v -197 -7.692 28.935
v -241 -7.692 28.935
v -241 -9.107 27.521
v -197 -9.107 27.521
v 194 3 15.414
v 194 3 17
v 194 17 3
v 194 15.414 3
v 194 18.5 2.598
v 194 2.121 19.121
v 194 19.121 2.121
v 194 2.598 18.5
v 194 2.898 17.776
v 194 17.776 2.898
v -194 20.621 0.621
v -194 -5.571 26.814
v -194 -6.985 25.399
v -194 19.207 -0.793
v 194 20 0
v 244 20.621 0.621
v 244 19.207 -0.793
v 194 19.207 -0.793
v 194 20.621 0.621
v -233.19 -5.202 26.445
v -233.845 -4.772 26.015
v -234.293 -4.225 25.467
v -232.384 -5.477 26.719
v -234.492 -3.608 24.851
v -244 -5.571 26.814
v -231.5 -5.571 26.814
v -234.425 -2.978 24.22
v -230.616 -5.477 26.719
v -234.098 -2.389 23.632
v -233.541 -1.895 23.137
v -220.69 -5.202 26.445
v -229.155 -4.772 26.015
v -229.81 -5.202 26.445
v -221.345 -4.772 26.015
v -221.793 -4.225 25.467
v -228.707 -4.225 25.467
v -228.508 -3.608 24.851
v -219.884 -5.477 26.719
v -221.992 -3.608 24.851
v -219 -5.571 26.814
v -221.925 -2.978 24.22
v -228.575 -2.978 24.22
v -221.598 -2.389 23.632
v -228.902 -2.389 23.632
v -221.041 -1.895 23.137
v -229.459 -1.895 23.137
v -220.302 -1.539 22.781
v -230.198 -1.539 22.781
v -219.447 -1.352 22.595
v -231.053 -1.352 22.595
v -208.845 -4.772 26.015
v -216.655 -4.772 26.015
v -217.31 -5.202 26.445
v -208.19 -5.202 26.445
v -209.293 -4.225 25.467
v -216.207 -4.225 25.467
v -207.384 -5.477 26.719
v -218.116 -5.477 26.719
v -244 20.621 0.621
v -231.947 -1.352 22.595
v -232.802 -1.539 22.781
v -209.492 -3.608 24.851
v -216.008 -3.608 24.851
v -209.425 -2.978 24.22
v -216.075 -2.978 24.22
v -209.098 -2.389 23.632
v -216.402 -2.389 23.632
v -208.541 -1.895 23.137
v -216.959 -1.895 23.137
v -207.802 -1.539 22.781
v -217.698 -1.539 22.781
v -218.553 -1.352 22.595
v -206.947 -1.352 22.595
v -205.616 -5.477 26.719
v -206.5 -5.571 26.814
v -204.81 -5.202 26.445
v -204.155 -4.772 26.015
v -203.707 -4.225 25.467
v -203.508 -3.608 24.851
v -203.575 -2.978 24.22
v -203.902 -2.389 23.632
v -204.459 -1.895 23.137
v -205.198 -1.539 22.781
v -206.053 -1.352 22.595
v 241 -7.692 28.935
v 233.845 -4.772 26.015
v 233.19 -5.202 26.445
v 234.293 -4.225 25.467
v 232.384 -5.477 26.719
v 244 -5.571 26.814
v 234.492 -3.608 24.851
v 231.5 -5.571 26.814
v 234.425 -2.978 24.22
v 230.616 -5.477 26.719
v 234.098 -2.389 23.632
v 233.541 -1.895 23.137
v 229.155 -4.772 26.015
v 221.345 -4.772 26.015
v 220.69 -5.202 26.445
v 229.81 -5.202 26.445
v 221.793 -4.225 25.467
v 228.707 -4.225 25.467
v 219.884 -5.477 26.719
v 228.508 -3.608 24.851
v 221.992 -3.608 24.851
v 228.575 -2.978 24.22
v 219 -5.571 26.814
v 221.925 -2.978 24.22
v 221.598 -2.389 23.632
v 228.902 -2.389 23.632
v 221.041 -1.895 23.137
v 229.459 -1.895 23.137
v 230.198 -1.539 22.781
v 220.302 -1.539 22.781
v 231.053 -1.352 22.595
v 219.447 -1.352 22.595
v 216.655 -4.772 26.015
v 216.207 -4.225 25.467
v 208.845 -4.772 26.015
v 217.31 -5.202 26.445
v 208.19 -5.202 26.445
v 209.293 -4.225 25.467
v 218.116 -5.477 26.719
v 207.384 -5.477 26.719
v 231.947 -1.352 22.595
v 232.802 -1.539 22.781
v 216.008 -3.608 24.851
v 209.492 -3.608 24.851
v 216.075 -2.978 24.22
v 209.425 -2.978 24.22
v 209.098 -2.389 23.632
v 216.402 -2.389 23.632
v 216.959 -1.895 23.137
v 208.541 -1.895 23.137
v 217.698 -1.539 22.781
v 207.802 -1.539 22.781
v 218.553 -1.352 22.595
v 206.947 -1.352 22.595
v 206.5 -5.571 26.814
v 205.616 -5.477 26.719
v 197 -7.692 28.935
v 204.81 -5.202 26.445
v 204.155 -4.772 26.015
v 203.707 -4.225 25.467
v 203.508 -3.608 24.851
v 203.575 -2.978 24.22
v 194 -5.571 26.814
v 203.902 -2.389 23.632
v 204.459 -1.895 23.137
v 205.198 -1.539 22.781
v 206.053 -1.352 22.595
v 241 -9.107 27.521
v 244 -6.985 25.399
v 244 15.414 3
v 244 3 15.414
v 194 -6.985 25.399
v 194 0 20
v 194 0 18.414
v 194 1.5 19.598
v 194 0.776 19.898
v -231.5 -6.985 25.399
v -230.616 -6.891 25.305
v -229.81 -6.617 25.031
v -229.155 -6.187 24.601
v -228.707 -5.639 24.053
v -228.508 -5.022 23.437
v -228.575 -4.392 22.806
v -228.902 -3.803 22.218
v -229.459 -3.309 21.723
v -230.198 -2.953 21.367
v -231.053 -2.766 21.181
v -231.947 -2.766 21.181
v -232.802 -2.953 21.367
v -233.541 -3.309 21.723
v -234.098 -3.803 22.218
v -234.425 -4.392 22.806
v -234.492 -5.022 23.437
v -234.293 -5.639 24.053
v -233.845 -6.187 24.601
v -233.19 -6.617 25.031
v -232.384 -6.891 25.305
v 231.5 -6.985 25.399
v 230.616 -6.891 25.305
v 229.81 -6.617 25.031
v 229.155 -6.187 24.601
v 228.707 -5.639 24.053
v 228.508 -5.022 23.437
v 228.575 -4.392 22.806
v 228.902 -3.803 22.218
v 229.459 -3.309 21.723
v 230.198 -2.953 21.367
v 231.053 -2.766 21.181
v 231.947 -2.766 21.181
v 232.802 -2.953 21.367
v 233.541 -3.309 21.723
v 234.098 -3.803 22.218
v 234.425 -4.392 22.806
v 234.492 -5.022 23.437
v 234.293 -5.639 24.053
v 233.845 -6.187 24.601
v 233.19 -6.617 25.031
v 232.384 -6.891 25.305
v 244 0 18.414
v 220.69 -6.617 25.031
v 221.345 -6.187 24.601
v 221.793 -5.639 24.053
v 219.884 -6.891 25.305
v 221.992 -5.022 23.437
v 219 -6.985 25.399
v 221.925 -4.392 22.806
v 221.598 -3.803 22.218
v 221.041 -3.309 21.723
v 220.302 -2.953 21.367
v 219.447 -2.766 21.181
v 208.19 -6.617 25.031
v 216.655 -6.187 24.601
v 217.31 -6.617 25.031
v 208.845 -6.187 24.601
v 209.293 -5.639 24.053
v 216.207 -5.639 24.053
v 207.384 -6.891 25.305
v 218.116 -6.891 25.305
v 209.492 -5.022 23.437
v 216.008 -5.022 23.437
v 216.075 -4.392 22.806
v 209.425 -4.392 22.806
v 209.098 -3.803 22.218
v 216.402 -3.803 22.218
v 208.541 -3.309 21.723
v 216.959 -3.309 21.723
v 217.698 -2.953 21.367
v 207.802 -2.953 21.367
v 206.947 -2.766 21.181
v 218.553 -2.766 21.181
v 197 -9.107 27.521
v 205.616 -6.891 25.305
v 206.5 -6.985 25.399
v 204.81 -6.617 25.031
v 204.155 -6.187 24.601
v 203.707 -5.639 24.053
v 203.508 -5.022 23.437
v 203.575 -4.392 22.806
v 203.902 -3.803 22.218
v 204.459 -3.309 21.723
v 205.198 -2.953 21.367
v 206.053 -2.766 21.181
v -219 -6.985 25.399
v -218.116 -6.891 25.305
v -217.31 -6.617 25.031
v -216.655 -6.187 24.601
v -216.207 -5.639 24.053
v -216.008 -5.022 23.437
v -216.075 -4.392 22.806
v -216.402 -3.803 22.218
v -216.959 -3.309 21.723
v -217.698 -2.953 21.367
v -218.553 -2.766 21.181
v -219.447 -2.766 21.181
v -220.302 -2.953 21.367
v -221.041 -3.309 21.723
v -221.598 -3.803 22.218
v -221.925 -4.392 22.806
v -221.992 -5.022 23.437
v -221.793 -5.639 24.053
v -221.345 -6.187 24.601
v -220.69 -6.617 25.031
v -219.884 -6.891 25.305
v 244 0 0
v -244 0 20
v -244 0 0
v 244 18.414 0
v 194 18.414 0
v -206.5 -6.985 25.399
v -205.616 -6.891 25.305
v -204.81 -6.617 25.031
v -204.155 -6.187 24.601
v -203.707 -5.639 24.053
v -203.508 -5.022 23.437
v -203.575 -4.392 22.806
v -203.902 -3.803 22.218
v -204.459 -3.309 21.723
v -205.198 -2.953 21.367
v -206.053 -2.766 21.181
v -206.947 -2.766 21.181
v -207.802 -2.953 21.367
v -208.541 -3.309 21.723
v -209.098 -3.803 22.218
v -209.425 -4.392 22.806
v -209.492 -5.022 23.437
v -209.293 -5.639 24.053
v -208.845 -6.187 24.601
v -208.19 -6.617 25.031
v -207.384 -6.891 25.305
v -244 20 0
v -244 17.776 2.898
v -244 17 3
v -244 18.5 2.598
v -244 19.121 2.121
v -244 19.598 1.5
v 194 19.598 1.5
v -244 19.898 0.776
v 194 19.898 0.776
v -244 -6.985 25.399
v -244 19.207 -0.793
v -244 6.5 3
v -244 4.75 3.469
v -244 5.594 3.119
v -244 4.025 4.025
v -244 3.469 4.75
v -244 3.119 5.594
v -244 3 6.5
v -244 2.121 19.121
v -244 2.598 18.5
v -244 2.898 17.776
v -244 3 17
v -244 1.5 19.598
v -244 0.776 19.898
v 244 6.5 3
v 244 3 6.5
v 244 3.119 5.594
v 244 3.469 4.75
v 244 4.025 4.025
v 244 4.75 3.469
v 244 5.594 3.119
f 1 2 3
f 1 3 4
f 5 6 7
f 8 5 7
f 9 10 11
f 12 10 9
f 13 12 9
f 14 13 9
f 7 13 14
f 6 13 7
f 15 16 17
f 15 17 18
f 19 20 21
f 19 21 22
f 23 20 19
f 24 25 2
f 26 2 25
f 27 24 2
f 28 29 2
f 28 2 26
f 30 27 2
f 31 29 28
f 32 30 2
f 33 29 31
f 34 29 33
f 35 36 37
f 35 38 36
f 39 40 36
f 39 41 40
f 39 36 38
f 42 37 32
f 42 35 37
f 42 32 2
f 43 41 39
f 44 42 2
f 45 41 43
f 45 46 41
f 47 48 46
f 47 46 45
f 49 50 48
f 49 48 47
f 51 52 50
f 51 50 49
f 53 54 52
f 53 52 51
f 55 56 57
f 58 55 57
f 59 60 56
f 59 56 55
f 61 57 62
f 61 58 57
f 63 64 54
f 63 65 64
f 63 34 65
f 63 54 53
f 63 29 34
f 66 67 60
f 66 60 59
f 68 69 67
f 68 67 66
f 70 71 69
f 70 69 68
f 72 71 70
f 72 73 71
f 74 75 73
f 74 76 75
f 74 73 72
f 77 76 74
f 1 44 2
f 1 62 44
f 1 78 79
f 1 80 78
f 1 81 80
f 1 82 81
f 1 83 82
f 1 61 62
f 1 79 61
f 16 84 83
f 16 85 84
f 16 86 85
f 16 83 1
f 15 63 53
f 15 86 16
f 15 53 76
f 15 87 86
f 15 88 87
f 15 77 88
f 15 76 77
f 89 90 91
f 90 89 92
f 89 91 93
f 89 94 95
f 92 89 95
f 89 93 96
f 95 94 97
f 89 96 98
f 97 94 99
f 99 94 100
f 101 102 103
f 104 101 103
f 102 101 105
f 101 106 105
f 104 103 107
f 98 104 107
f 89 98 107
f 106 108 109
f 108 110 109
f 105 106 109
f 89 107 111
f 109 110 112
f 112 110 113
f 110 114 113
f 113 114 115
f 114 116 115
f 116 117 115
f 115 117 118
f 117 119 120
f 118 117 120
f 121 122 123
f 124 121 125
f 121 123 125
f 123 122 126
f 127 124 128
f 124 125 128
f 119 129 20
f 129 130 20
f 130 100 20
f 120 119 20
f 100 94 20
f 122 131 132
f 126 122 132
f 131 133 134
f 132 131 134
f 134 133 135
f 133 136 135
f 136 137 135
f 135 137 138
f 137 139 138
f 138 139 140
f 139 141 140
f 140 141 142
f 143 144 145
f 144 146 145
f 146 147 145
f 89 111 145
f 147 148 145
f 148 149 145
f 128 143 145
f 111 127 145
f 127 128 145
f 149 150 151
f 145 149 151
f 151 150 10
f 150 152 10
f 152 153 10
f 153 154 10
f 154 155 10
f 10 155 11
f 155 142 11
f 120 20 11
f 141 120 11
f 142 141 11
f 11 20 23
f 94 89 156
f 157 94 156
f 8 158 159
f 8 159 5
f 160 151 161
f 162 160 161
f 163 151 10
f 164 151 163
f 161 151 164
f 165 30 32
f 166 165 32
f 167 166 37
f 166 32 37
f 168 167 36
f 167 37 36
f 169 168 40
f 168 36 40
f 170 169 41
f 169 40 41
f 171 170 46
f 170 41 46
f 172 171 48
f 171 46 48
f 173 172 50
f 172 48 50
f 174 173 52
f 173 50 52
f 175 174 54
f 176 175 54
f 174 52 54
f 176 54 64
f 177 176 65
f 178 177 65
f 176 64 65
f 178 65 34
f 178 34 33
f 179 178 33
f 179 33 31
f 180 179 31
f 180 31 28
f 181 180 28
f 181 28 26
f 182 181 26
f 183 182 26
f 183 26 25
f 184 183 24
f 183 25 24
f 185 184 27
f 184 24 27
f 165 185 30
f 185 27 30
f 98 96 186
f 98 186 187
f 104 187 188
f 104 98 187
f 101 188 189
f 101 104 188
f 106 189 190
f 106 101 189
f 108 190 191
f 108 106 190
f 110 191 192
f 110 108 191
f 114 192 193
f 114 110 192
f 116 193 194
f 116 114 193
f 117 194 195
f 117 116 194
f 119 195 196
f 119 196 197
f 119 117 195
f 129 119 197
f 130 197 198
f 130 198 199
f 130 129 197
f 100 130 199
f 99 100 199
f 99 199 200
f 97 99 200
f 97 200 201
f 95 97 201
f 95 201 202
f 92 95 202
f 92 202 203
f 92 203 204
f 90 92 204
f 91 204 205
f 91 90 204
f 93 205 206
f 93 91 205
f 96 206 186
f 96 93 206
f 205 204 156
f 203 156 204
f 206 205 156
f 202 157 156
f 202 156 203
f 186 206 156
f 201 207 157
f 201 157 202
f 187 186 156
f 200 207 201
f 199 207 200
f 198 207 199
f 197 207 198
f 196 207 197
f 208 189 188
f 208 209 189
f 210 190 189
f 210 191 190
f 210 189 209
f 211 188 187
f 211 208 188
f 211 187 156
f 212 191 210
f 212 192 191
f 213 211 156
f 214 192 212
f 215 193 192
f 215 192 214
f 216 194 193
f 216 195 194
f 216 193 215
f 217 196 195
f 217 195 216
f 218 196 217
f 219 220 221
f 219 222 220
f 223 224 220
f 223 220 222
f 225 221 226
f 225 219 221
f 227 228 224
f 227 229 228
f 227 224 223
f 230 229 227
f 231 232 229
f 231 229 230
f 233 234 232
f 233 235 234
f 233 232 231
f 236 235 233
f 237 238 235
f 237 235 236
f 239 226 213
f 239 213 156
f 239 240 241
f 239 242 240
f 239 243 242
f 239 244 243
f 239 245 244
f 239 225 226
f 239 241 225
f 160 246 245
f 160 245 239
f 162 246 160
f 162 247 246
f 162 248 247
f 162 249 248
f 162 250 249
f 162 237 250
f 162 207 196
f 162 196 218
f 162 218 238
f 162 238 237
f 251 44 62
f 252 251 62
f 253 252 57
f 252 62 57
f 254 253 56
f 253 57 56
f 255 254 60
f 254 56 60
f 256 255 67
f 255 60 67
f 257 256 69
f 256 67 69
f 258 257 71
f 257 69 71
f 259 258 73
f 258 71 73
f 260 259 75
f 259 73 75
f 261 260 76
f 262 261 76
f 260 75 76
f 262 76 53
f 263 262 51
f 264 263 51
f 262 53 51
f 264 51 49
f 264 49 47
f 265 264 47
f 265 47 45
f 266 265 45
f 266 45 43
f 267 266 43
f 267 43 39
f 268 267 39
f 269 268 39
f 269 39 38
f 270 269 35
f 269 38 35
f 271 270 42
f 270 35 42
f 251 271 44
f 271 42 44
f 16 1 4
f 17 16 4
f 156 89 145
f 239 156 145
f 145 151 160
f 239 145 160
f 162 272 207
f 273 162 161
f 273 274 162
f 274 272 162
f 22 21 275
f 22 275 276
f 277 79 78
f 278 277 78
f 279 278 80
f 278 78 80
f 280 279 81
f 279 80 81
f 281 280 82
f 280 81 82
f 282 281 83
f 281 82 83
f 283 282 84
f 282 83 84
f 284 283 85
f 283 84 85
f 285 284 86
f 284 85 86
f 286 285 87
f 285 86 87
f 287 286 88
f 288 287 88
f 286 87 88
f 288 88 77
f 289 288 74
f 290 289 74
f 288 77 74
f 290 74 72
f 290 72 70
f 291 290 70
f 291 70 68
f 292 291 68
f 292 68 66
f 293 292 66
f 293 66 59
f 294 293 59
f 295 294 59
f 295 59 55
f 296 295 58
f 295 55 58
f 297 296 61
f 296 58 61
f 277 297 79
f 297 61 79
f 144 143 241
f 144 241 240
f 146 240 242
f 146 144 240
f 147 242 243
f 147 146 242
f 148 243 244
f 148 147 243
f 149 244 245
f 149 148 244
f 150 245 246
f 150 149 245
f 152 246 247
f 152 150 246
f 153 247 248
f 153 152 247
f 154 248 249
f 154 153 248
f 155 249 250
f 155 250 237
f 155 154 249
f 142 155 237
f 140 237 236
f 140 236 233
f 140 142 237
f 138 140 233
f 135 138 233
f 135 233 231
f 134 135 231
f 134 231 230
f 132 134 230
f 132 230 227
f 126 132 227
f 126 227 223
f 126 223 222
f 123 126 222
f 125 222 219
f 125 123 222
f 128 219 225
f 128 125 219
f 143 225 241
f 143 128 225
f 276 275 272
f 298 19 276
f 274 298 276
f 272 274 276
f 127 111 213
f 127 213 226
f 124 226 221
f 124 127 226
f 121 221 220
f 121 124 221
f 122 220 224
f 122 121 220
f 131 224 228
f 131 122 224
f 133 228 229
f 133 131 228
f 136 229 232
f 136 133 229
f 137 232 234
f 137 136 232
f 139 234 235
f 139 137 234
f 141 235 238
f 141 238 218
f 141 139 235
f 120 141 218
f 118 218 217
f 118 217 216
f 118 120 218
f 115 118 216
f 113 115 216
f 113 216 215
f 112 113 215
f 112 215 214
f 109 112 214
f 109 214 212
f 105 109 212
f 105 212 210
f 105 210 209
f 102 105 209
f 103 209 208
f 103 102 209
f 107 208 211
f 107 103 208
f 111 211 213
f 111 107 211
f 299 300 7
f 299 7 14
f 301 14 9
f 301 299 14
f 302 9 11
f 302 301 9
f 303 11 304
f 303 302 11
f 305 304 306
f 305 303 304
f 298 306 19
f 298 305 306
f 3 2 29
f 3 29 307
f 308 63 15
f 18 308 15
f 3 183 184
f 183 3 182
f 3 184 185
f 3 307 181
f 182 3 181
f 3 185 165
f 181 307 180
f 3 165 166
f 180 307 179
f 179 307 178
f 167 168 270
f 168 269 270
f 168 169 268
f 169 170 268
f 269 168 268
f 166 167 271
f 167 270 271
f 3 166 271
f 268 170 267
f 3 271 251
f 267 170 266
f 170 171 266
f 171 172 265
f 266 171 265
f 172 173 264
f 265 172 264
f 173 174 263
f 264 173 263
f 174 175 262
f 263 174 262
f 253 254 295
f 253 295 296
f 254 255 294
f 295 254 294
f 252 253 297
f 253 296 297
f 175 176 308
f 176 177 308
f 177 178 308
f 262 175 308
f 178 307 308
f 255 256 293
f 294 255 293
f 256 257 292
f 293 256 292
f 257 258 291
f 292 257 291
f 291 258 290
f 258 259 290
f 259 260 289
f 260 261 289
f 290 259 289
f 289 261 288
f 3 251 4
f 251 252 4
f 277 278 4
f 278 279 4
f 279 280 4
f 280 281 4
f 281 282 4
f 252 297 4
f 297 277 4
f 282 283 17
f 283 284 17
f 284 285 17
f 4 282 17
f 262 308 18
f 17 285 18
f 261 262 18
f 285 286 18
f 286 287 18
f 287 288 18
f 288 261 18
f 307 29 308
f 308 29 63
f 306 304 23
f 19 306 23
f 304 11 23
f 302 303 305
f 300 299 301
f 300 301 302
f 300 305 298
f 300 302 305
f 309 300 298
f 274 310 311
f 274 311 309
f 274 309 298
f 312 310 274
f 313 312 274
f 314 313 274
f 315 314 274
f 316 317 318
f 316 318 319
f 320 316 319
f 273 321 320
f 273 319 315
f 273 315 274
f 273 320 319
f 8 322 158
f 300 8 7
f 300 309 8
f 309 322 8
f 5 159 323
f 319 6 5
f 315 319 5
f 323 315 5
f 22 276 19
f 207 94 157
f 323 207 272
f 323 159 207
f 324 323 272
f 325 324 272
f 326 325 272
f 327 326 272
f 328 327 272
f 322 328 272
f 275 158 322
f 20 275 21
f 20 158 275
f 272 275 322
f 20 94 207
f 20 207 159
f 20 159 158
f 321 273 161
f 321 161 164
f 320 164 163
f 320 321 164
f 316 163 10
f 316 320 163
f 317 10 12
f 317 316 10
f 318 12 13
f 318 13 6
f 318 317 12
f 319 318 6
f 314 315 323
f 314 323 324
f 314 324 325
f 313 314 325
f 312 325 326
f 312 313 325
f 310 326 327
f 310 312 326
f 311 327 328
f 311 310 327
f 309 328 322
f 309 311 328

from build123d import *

# Parameters (mm, degrees)
HIERRO_ANGULAR_20_X_20_X_3_1_DEPTH = 488
CROQUIS3_W                         = 50
CROQUIS3_H                         = 40.041630561
CROQUIS3_R                         = 3
SALIENTE_EXTRUIR1_DEPTH            = 2
CHAFL_N1_SIZE                      = 3
CHAFL_N1_OF_SIMETR_A3_SIZE         = 3


with BuildPart() as part:
    # Sketch1 → Hierro angular 20 X 20 X 3(1) (new body)
    with BuildSketch(Plane.YZ.offset(-244)):
        with BuildLine():
            Line((0, 0), (0, 20))
            ThreePointArc((0, 20), (2.121320344, 19.121320344), (3, 17))
            Line((3, 17), (3, 6.5))
            ThreePointArc((3, 6.5), (4.025126266, 4.025126266), (6.5, 3))
            Line((6.5, 3), (17, 3))
            ThreePointArc((17, 3), (19.121320344, 2.121320344), (20, 0))
            Line((20, 0), (0, 0))
        make_face()
    extrude(amount=HIERRO_ANGULAR_20_X_20_X_3_1_DEPTH)


with BuildPart() as body_2:
    # Croquis3 → Saliente-Extruir1 (new body)
    with BuildSketch(Plane(origin=(0, 10.621320344, 10.621320344), x_dir=(1, 0, 0), z_dir=(0, 0.7071067811865477, 0.7071067811865475))):
        with Locations((-219, -5.878679656)):
            Rectangle(CROQUIS3_W, CROQUIS3_H)
        with Locations(Location((-206.5, -19.899494937, 0), (0, 0, 270))):
            Circle(CROQUIS3_R, mode=Mode.SUBTRACT)
        with Locations(Location((-219, -19.899494937, 0), (0, 0, 270))):
            Circle(CROQUIS3_R, mode=Mode.SUBTRACT)
        with Locations(Location((-231.5, -19.899494937, 0), (0, 0, 270))):
            Circle(CROQUIS3_R, mode=Mode.SUBTRACT)
    saliente_extruir1 = extrude(amount=-SALIENTE_EXTRUIR1_DEPTH)

    # Chaflán1
    chafl_n1_edges = [body_2.edges().sort_by_distance(p)[0] for p in [
        (-194, -8.399494937, 28.227922061),
        (-244, -8.399494937, 28.227922061),
    ]]
    chamfer(chafl_n1_edges, length=CHAFL_N1_SIZE)


with BuildPart() as part_1:
    add(part.part)

    # Simetría3: Saliente-Extruir1 across plane
    add(saliente_extruir1.mirror(Plane(origin=(0, 0, 0), x_dir=(0, 0, 1), z_dir=(1, 0, 0))))

    # Chaflán1 of Simetría3
    chafl_n1_of_simetr_a3_edges = [part_1.edges().sort_by_distance(p)[0] for p in [
        (194, -8.399494937, 28.227922061),
        (244, -8.399494937, 28.227922061),
    ]]
    chamfer(chafl_n1_of_simetr_a3_edges, length=CHAFL_N1_OF_SIMETR_A3_SIZE)


solid = Compound([body_2.part, part_1.part])
